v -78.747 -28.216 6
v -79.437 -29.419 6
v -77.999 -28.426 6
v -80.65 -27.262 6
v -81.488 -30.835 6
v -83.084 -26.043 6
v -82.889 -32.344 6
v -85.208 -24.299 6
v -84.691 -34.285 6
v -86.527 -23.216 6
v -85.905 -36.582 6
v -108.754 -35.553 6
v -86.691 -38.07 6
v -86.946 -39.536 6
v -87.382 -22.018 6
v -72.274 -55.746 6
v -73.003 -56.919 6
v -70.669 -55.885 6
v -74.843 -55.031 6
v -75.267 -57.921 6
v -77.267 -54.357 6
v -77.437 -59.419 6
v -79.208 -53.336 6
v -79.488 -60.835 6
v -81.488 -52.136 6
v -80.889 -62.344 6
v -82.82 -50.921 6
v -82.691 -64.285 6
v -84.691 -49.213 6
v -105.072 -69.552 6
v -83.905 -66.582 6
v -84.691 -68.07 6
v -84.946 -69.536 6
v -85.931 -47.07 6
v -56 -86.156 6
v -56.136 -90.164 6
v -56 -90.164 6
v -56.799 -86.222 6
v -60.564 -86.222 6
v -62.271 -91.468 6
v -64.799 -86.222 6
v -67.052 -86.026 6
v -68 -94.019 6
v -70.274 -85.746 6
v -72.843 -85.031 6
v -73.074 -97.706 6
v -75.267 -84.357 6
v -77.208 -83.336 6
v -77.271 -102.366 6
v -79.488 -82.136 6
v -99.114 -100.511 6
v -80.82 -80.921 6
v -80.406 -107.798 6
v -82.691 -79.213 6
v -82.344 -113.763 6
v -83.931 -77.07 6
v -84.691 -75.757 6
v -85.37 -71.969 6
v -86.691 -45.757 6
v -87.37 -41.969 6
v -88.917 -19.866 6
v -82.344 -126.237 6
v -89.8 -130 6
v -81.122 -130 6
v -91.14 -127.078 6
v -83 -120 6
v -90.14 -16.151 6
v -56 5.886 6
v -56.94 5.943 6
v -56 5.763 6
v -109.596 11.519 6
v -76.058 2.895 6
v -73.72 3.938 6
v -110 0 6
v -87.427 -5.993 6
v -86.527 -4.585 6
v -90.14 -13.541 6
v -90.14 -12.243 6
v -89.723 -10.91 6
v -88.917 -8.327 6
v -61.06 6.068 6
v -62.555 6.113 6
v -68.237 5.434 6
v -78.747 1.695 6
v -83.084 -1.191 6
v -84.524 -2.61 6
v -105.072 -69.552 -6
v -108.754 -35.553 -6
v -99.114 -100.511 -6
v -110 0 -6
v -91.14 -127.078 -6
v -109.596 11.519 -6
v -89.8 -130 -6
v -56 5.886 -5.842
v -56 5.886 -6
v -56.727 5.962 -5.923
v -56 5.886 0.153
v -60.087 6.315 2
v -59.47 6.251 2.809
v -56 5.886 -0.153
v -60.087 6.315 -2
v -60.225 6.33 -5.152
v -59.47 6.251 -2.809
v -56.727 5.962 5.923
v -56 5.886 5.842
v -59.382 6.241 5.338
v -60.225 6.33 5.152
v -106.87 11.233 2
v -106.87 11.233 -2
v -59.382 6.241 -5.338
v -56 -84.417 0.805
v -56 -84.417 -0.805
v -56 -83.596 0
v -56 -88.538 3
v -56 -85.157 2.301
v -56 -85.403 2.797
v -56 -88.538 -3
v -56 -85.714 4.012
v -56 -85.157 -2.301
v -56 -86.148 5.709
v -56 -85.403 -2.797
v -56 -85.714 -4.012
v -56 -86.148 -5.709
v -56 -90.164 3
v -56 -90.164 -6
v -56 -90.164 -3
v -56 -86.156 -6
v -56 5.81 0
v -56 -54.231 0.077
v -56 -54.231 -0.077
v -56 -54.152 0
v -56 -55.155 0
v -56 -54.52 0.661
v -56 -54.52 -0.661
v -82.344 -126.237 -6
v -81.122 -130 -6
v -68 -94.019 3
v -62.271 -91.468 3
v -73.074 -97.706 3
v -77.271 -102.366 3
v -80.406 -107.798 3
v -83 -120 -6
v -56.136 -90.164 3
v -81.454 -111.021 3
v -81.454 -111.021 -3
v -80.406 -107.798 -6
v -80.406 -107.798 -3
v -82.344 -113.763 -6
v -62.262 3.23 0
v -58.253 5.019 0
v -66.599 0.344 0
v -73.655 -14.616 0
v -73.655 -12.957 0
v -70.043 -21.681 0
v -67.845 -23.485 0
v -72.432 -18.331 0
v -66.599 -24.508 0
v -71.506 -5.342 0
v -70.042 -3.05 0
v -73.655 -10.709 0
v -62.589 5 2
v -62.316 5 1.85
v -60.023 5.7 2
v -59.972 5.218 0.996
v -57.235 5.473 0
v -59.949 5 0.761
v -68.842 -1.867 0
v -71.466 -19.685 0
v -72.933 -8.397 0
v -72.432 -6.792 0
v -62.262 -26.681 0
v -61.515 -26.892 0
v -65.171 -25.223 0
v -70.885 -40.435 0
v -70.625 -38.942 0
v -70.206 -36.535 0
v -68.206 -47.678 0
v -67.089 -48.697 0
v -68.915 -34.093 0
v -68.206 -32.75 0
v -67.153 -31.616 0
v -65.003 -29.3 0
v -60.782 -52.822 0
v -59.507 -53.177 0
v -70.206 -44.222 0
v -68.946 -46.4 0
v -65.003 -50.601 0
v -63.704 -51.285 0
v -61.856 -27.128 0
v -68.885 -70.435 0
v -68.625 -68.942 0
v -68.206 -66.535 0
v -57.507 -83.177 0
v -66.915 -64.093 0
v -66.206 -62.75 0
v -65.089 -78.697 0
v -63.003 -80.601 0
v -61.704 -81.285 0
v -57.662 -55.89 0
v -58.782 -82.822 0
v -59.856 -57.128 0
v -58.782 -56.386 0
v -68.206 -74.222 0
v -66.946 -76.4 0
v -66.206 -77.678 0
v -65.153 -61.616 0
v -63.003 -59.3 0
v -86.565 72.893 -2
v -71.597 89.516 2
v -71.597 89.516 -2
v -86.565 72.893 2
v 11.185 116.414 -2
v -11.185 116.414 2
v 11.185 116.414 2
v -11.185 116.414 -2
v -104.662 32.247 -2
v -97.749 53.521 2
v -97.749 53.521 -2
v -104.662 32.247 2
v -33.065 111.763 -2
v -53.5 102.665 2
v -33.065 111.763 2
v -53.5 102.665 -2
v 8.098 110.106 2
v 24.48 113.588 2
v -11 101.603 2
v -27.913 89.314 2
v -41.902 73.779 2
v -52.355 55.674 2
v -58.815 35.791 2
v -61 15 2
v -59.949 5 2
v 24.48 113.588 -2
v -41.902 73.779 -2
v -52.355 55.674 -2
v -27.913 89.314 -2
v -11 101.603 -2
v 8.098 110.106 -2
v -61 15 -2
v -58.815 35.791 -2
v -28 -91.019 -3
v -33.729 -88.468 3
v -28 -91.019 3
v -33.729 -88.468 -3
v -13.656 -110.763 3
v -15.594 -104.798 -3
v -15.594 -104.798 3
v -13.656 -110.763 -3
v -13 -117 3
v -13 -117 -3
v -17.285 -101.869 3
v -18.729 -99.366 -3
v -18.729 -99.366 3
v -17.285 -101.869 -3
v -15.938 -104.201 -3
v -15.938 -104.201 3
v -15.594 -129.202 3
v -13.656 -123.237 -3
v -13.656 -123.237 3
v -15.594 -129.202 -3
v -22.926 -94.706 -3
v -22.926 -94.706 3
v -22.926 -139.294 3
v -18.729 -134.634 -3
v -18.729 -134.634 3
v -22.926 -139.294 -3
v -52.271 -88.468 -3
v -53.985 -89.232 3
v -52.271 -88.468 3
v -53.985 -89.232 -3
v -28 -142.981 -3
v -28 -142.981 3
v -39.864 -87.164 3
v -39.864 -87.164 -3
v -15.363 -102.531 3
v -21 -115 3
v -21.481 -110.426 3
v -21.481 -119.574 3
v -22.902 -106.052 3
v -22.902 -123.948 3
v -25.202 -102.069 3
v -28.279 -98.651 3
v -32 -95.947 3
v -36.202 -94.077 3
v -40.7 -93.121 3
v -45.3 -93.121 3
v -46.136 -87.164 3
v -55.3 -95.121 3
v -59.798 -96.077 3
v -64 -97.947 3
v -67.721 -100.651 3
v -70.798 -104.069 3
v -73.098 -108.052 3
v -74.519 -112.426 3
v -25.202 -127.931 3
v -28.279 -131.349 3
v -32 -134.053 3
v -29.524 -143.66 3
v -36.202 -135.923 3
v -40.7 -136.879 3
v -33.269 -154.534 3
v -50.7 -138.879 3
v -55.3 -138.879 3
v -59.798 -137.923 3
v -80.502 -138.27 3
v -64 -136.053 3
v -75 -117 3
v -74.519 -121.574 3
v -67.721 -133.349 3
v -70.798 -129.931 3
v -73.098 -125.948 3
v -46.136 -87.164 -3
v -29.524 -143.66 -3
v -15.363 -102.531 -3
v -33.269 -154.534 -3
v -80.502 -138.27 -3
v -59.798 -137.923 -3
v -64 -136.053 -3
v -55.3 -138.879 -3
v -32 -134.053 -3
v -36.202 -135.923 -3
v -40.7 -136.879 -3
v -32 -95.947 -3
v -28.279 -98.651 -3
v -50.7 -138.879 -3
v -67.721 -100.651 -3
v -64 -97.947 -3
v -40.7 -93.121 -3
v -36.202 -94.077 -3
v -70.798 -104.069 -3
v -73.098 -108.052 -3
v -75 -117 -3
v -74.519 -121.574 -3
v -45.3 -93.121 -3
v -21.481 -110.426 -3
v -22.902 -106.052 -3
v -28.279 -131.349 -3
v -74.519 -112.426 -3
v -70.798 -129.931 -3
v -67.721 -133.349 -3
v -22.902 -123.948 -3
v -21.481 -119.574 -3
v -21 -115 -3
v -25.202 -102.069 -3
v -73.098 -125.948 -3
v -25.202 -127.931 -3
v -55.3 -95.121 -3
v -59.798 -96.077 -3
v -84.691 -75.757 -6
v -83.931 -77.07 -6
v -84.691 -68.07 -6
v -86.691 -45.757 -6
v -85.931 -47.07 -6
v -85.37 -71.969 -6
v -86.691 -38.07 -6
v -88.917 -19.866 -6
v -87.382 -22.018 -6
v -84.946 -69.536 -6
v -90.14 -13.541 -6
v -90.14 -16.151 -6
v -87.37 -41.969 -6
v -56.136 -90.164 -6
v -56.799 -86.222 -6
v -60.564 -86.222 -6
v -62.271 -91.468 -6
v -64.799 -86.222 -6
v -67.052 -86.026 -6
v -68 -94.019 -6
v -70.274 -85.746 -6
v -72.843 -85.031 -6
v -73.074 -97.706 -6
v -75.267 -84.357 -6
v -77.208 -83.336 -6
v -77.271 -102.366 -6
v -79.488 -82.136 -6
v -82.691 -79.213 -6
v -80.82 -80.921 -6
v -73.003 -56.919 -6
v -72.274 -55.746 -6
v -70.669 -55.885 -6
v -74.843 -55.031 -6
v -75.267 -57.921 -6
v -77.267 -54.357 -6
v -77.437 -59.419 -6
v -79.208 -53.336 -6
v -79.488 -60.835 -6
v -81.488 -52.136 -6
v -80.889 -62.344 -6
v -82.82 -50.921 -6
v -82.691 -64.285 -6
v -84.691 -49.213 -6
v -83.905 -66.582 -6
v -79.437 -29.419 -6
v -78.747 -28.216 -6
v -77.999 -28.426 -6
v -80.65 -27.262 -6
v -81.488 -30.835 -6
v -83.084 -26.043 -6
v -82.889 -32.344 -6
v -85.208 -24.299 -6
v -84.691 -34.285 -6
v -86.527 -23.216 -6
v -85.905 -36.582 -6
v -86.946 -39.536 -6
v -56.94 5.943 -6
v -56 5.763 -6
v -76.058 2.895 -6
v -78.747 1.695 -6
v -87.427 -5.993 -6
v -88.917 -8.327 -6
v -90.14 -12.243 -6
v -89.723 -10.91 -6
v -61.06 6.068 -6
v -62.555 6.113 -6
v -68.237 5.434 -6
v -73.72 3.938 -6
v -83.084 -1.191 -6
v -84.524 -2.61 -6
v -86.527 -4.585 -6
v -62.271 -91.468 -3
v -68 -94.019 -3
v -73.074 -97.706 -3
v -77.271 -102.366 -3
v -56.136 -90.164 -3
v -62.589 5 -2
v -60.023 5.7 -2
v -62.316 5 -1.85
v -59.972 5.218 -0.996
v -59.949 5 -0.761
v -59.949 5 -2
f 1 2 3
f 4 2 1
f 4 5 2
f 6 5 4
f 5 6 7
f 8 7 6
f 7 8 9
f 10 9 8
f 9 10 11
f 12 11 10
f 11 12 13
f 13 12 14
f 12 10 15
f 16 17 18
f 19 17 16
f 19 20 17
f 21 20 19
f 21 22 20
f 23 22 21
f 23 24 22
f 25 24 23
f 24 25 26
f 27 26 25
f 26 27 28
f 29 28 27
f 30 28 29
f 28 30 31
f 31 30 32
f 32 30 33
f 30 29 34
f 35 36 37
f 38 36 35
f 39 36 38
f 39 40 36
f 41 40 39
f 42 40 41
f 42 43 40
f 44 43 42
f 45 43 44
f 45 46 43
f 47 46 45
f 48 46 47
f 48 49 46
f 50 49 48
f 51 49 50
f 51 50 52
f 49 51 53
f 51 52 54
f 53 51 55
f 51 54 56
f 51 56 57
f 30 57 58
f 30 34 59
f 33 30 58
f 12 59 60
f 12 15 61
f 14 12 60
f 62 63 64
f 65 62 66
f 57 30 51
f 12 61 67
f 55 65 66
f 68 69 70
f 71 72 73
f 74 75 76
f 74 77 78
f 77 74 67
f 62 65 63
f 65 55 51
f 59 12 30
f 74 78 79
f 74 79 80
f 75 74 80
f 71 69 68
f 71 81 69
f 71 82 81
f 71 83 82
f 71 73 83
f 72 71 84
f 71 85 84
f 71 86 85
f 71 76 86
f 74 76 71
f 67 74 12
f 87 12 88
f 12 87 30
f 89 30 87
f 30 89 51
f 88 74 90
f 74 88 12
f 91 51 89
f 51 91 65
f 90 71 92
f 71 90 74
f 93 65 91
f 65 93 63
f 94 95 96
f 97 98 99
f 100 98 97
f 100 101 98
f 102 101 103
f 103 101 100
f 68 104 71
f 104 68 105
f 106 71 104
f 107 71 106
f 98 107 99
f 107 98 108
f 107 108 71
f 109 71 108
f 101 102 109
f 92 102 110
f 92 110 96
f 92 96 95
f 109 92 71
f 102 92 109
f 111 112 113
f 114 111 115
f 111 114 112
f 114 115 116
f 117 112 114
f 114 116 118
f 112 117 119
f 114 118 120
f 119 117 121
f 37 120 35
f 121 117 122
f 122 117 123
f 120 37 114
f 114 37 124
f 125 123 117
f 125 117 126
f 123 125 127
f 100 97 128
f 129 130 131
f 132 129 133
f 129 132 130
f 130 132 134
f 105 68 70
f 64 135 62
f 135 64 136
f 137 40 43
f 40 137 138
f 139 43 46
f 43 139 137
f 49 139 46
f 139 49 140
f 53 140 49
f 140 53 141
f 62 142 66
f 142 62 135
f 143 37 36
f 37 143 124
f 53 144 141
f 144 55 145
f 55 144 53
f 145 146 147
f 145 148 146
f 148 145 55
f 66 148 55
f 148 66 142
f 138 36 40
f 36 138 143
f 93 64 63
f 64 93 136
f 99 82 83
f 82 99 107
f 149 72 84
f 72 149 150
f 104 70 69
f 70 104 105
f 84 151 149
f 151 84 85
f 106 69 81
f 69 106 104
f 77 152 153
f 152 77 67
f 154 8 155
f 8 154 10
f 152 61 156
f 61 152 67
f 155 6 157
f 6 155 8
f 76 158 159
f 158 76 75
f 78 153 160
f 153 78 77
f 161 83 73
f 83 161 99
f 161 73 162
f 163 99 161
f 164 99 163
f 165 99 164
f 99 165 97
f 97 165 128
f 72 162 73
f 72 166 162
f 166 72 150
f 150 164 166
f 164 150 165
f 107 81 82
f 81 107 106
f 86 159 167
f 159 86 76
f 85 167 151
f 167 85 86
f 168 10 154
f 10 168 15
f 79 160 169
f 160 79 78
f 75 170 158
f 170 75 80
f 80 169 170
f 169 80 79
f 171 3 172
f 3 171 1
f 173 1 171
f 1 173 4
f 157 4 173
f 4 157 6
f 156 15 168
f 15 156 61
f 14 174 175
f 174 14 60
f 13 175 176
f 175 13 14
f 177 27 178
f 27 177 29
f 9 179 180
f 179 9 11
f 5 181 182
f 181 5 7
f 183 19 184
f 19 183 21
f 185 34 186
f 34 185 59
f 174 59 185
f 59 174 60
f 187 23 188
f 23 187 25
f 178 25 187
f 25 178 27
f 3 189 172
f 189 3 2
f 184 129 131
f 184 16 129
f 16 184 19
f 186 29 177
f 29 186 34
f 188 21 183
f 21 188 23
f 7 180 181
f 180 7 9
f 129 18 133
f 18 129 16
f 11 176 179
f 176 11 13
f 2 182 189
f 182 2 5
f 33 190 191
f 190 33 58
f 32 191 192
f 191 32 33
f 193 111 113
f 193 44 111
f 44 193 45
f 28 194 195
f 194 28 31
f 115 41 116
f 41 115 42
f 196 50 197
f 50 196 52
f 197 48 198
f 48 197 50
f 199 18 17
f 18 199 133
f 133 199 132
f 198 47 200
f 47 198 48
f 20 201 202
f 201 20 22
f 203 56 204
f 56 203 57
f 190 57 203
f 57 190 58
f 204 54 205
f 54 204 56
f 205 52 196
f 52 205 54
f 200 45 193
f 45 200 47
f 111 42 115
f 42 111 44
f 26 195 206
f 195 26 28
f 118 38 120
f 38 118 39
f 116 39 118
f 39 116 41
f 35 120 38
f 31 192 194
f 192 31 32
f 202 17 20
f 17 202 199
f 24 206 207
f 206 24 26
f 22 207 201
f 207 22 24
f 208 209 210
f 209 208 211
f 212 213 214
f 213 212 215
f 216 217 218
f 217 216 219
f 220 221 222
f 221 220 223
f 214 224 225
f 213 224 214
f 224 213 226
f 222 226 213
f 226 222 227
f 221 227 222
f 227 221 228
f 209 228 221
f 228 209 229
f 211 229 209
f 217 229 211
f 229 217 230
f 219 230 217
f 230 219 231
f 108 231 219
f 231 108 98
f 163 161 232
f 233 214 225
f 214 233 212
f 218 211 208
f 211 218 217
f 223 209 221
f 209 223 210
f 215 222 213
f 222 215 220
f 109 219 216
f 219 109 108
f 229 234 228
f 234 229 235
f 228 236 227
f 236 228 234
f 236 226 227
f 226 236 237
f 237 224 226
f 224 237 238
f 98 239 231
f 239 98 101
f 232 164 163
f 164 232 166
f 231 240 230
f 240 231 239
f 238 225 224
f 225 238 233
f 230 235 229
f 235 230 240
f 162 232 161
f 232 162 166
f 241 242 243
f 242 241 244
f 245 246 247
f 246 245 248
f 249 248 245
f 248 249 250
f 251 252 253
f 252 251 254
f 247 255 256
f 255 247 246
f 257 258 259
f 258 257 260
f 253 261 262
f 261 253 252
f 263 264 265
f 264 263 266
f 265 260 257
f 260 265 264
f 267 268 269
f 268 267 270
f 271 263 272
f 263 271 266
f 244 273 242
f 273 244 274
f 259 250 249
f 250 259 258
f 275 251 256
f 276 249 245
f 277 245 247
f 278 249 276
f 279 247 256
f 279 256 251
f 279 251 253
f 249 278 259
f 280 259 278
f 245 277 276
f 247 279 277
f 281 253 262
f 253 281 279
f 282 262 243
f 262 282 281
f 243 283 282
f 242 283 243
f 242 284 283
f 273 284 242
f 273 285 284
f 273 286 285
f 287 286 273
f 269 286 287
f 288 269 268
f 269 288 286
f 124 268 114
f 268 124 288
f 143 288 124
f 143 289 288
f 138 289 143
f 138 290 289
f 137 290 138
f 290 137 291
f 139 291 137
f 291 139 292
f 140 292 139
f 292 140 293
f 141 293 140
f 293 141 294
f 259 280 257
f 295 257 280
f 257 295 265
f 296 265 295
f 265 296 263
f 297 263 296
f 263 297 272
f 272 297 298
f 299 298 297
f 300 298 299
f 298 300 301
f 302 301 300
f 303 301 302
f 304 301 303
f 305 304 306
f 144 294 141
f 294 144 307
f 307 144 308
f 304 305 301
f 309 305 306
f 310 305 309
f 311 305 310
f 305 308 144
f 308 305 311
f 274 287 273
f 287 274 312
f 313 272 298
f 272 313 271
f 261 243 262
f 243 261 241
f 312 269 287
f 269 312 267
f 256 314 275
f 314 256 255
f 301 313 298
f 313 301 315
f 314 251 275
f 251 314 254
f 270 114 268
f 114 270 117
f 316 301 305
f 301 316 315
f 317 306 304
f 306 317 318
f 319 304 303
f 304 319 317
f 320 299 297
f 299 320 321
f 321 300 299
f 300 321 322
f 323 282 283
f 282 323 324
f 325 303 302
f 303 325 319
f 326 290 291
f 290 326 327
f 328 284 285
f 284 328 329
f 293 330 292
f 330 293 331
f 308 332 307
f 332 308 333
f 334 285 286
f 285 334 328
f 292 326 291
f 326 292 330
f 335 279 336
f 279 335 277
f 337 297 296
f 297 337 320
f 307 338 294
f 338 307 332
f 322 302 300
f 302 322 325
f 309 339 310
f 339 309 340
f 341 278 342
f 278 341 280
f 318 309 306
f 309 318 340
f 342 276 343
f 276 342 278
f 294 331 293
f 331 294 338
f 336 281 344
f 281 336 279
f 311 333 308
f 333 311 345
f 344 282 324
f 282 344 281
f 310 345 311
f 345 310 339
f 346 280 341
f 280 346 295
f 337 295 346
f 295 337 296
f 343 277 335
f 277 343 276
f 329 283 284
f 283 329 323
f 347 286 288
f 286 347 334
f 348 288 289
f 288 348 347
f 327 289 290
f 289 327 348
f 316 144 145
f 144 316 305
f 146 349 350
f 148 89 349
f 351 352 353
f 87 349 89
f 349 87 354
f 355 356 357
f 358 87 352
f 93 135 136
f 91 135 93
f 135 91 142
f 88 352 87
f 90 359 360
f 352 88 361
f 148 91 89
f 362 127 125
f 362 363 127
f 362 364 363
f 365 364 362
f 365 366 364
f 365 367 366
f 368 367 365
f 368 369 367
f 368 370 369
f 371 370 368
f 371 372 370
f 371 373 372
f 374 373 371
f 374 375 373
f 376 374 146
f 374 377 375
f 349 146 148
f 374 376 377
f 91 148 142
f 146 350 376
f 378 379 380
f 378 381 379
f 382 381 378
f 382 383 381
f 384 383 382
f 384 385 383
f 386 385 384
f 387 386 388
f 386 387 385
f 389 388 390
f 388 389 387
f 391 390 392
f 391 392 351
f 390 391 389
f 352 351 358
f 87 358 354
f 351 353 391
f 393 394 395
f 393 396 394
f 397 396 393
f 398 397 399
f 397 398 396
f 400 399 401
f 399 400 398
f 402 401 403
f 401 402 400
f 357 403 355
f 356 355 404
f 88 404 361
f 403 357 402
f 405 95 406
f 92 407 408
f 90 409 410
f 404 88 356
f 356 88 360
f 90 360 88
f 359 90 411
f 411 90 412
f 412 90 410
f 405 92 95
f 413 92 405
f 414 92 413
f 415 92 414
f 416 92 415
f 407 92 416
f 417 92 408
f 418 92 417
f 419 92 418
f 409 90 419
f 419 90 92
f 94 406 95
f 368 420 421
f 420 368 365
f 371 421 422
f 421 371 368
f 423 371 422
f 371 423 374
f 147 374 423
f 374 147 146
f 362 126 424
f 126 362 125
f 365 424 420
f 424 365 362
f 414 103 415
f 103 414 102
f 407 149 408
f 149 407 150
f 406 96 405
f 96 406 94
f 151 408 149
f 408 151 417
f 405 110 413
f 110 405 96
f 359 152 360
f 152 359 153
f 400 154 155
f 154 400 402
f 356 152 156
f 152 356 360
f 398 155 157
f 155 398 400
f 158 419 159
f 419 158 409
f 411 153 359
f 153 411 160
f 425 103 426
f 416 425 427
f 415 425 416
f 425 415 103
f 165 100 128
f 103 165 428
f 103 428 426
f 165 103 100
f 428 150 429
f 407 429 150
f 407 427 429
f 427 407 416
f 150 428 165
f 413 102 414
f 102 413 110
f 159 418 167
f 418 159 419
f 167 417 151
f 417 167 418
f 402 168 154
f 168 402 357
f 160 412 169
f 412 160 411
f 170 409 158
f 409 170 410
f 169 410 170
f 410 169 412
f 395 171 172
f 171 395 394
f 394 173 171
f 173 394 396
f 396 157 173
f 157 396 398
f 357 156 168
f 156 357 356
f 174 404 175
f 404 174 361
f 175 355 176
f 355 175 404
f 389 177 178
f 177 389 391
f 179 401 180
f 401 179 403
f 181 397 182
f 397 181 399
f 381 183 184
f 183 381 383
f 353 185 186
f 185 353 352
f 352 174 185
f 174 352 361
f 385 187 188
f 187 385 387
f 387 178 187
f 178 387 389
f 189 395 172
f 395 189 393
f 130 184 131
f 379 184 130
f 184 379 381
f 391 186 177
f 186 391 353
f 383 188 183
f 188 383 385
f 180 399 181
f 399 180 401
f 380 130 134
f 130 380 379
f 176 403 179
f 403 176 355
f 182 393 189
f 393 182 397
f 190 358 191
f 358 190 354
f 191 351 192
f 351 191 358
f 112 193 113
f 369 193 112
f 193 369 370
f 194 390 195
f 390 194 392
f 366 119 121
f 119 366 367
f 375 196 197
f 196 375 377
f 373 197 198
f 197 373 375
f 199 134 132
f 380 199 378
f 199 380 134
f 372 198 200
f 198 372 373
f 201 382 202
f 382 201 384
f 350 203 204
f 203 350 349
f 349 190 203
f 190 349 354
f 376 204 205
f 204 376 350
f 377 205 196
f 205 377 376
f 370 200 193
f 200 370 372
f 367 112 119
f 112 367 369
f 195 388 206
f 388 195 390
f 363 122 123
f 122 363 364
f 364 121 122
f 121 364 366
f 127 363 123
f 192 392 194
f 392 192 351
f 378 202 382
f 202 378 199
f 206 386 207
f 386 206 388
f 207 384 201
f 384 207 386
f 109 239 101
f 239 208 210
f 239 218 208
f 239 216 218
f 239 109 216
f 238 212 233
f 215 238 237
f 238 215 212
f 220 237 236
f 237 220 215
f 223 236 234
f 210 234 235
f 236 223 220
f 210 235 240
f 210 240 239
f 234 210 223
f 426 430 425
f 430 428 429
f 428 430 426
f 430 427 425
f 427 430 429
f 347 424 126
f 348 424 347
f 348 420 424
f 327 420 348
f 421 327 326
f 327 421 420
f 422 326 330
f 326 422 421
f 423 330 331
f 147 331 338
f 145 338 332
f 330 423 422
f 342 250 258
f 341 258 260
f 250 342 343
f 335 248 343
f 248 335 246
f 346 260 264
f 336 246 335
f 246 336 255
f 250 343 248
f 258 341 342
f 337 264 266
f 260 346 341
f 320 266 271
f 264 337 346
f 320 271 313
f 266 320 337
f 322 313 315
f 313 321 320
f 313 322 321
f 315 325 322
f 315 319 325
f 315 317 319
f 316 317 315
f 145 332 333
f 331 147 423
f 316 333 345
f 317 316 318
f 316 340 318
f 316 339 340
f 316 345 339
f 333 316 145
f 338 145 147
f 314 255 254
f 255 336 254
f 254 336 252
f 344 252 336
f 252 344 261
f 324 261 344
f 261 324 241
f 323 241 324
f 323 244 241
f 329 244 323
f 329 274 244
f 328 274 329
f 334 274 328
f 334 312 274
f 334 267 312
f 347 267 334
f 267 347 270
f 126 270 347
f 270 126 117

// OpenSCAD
toleranta=1;
module karambit(){
    //Maner    
    difference(){
    color("DimGray")translate([-53,0,0])scale(v = [1, 3, 1]) cylinder(h=4+2*toleranta,r=57);
    rotate([0,0,-6])translate([-125,0,-1])cube([170,165,6+2*toleranta]);
    translate([-56,-170,-1])cube([100,180,6+2*toleranta]);
    translate([-53,-120,-1])cylinder(h=6+2*toleranta,r=30);
    translate([-96,-174,-1])cube([50,44,6+2*toleranta]);    
    //forma deget 1
    hull(){
        translate([-42,-10,-2])rotate([5,-70,0])scale(v = [1, 2, 1]) cylinder(h=70+2*toleranta,r=9);
    translate([-40,-10,-2])rotate([5,-70,0])scale(v = [1, 2, 1]) cylinder(h=70+2*toleranta,r=8);
    }
    //forma deget 2
    hull(){
    translate([-42,-38,-2])rotate([5,-70,0])scale(v = [1, 2, 1]) cylinder(h=70+2*toleranta,r=8);
    translate([-32,-38,-2])rotate([5,-70,0])scale(v = [1, 2, 1]) cylinder(h=70+2*toleranta,r=8);
    }
    //forma deget 3
    hull(){
    translate([-40,-68,-2])rotate([5,-70,0])scale(v = [1, 2, 1]) cylinder(h=70+2*toleranta,r=8);
    translate([-32,-68,-2])rotate([5,-70,0])scale(v = [1, 2, 1]) cylinder(h=50+2*toleranta,r=8);
    }

};

    //-------------------------------------------------------------------
    //Lama   
    difference(){
        color("CadetBlue")translate([0,10,0])rotate([0,0,0])cylinder(h=2,r=107);
        translate([39,15,-1])cylinder(h=2+2*toleranta,r=100);
        translate([-100,-110,-1])cube([150,115,2+2*toleranta]);
            
        
           
     }
    //-------------------------------------------------------------------
    //Inel Metalic    
    difference(){    
        color("CadetBlue")union() {    
        translate([-43,-117,-1])cylinder(h=2+2*toleranta,r=30);
        translate([-90,-135,-1])rotate([0,0,-19])cube([60,55,2+2*toleranta]);    
    }
      hull(){
        translate([-43,-115,-2])cylinder(h=4+2*toleranta,r=22);
        translate([-53,-117,-2])cylinder(h=4+2*toleranta,r=22);
        }
        //translate([-120,-183,-2])rotate([0,0,-28])cube([60,55,4+2*toleranta]); 
        translate([-100,-153,-2])rotate([0,0,2])cube([20,45,4+2*toleranta]); 
      }
    }
    mirror([0,0,1])karambit();
    karambit();
